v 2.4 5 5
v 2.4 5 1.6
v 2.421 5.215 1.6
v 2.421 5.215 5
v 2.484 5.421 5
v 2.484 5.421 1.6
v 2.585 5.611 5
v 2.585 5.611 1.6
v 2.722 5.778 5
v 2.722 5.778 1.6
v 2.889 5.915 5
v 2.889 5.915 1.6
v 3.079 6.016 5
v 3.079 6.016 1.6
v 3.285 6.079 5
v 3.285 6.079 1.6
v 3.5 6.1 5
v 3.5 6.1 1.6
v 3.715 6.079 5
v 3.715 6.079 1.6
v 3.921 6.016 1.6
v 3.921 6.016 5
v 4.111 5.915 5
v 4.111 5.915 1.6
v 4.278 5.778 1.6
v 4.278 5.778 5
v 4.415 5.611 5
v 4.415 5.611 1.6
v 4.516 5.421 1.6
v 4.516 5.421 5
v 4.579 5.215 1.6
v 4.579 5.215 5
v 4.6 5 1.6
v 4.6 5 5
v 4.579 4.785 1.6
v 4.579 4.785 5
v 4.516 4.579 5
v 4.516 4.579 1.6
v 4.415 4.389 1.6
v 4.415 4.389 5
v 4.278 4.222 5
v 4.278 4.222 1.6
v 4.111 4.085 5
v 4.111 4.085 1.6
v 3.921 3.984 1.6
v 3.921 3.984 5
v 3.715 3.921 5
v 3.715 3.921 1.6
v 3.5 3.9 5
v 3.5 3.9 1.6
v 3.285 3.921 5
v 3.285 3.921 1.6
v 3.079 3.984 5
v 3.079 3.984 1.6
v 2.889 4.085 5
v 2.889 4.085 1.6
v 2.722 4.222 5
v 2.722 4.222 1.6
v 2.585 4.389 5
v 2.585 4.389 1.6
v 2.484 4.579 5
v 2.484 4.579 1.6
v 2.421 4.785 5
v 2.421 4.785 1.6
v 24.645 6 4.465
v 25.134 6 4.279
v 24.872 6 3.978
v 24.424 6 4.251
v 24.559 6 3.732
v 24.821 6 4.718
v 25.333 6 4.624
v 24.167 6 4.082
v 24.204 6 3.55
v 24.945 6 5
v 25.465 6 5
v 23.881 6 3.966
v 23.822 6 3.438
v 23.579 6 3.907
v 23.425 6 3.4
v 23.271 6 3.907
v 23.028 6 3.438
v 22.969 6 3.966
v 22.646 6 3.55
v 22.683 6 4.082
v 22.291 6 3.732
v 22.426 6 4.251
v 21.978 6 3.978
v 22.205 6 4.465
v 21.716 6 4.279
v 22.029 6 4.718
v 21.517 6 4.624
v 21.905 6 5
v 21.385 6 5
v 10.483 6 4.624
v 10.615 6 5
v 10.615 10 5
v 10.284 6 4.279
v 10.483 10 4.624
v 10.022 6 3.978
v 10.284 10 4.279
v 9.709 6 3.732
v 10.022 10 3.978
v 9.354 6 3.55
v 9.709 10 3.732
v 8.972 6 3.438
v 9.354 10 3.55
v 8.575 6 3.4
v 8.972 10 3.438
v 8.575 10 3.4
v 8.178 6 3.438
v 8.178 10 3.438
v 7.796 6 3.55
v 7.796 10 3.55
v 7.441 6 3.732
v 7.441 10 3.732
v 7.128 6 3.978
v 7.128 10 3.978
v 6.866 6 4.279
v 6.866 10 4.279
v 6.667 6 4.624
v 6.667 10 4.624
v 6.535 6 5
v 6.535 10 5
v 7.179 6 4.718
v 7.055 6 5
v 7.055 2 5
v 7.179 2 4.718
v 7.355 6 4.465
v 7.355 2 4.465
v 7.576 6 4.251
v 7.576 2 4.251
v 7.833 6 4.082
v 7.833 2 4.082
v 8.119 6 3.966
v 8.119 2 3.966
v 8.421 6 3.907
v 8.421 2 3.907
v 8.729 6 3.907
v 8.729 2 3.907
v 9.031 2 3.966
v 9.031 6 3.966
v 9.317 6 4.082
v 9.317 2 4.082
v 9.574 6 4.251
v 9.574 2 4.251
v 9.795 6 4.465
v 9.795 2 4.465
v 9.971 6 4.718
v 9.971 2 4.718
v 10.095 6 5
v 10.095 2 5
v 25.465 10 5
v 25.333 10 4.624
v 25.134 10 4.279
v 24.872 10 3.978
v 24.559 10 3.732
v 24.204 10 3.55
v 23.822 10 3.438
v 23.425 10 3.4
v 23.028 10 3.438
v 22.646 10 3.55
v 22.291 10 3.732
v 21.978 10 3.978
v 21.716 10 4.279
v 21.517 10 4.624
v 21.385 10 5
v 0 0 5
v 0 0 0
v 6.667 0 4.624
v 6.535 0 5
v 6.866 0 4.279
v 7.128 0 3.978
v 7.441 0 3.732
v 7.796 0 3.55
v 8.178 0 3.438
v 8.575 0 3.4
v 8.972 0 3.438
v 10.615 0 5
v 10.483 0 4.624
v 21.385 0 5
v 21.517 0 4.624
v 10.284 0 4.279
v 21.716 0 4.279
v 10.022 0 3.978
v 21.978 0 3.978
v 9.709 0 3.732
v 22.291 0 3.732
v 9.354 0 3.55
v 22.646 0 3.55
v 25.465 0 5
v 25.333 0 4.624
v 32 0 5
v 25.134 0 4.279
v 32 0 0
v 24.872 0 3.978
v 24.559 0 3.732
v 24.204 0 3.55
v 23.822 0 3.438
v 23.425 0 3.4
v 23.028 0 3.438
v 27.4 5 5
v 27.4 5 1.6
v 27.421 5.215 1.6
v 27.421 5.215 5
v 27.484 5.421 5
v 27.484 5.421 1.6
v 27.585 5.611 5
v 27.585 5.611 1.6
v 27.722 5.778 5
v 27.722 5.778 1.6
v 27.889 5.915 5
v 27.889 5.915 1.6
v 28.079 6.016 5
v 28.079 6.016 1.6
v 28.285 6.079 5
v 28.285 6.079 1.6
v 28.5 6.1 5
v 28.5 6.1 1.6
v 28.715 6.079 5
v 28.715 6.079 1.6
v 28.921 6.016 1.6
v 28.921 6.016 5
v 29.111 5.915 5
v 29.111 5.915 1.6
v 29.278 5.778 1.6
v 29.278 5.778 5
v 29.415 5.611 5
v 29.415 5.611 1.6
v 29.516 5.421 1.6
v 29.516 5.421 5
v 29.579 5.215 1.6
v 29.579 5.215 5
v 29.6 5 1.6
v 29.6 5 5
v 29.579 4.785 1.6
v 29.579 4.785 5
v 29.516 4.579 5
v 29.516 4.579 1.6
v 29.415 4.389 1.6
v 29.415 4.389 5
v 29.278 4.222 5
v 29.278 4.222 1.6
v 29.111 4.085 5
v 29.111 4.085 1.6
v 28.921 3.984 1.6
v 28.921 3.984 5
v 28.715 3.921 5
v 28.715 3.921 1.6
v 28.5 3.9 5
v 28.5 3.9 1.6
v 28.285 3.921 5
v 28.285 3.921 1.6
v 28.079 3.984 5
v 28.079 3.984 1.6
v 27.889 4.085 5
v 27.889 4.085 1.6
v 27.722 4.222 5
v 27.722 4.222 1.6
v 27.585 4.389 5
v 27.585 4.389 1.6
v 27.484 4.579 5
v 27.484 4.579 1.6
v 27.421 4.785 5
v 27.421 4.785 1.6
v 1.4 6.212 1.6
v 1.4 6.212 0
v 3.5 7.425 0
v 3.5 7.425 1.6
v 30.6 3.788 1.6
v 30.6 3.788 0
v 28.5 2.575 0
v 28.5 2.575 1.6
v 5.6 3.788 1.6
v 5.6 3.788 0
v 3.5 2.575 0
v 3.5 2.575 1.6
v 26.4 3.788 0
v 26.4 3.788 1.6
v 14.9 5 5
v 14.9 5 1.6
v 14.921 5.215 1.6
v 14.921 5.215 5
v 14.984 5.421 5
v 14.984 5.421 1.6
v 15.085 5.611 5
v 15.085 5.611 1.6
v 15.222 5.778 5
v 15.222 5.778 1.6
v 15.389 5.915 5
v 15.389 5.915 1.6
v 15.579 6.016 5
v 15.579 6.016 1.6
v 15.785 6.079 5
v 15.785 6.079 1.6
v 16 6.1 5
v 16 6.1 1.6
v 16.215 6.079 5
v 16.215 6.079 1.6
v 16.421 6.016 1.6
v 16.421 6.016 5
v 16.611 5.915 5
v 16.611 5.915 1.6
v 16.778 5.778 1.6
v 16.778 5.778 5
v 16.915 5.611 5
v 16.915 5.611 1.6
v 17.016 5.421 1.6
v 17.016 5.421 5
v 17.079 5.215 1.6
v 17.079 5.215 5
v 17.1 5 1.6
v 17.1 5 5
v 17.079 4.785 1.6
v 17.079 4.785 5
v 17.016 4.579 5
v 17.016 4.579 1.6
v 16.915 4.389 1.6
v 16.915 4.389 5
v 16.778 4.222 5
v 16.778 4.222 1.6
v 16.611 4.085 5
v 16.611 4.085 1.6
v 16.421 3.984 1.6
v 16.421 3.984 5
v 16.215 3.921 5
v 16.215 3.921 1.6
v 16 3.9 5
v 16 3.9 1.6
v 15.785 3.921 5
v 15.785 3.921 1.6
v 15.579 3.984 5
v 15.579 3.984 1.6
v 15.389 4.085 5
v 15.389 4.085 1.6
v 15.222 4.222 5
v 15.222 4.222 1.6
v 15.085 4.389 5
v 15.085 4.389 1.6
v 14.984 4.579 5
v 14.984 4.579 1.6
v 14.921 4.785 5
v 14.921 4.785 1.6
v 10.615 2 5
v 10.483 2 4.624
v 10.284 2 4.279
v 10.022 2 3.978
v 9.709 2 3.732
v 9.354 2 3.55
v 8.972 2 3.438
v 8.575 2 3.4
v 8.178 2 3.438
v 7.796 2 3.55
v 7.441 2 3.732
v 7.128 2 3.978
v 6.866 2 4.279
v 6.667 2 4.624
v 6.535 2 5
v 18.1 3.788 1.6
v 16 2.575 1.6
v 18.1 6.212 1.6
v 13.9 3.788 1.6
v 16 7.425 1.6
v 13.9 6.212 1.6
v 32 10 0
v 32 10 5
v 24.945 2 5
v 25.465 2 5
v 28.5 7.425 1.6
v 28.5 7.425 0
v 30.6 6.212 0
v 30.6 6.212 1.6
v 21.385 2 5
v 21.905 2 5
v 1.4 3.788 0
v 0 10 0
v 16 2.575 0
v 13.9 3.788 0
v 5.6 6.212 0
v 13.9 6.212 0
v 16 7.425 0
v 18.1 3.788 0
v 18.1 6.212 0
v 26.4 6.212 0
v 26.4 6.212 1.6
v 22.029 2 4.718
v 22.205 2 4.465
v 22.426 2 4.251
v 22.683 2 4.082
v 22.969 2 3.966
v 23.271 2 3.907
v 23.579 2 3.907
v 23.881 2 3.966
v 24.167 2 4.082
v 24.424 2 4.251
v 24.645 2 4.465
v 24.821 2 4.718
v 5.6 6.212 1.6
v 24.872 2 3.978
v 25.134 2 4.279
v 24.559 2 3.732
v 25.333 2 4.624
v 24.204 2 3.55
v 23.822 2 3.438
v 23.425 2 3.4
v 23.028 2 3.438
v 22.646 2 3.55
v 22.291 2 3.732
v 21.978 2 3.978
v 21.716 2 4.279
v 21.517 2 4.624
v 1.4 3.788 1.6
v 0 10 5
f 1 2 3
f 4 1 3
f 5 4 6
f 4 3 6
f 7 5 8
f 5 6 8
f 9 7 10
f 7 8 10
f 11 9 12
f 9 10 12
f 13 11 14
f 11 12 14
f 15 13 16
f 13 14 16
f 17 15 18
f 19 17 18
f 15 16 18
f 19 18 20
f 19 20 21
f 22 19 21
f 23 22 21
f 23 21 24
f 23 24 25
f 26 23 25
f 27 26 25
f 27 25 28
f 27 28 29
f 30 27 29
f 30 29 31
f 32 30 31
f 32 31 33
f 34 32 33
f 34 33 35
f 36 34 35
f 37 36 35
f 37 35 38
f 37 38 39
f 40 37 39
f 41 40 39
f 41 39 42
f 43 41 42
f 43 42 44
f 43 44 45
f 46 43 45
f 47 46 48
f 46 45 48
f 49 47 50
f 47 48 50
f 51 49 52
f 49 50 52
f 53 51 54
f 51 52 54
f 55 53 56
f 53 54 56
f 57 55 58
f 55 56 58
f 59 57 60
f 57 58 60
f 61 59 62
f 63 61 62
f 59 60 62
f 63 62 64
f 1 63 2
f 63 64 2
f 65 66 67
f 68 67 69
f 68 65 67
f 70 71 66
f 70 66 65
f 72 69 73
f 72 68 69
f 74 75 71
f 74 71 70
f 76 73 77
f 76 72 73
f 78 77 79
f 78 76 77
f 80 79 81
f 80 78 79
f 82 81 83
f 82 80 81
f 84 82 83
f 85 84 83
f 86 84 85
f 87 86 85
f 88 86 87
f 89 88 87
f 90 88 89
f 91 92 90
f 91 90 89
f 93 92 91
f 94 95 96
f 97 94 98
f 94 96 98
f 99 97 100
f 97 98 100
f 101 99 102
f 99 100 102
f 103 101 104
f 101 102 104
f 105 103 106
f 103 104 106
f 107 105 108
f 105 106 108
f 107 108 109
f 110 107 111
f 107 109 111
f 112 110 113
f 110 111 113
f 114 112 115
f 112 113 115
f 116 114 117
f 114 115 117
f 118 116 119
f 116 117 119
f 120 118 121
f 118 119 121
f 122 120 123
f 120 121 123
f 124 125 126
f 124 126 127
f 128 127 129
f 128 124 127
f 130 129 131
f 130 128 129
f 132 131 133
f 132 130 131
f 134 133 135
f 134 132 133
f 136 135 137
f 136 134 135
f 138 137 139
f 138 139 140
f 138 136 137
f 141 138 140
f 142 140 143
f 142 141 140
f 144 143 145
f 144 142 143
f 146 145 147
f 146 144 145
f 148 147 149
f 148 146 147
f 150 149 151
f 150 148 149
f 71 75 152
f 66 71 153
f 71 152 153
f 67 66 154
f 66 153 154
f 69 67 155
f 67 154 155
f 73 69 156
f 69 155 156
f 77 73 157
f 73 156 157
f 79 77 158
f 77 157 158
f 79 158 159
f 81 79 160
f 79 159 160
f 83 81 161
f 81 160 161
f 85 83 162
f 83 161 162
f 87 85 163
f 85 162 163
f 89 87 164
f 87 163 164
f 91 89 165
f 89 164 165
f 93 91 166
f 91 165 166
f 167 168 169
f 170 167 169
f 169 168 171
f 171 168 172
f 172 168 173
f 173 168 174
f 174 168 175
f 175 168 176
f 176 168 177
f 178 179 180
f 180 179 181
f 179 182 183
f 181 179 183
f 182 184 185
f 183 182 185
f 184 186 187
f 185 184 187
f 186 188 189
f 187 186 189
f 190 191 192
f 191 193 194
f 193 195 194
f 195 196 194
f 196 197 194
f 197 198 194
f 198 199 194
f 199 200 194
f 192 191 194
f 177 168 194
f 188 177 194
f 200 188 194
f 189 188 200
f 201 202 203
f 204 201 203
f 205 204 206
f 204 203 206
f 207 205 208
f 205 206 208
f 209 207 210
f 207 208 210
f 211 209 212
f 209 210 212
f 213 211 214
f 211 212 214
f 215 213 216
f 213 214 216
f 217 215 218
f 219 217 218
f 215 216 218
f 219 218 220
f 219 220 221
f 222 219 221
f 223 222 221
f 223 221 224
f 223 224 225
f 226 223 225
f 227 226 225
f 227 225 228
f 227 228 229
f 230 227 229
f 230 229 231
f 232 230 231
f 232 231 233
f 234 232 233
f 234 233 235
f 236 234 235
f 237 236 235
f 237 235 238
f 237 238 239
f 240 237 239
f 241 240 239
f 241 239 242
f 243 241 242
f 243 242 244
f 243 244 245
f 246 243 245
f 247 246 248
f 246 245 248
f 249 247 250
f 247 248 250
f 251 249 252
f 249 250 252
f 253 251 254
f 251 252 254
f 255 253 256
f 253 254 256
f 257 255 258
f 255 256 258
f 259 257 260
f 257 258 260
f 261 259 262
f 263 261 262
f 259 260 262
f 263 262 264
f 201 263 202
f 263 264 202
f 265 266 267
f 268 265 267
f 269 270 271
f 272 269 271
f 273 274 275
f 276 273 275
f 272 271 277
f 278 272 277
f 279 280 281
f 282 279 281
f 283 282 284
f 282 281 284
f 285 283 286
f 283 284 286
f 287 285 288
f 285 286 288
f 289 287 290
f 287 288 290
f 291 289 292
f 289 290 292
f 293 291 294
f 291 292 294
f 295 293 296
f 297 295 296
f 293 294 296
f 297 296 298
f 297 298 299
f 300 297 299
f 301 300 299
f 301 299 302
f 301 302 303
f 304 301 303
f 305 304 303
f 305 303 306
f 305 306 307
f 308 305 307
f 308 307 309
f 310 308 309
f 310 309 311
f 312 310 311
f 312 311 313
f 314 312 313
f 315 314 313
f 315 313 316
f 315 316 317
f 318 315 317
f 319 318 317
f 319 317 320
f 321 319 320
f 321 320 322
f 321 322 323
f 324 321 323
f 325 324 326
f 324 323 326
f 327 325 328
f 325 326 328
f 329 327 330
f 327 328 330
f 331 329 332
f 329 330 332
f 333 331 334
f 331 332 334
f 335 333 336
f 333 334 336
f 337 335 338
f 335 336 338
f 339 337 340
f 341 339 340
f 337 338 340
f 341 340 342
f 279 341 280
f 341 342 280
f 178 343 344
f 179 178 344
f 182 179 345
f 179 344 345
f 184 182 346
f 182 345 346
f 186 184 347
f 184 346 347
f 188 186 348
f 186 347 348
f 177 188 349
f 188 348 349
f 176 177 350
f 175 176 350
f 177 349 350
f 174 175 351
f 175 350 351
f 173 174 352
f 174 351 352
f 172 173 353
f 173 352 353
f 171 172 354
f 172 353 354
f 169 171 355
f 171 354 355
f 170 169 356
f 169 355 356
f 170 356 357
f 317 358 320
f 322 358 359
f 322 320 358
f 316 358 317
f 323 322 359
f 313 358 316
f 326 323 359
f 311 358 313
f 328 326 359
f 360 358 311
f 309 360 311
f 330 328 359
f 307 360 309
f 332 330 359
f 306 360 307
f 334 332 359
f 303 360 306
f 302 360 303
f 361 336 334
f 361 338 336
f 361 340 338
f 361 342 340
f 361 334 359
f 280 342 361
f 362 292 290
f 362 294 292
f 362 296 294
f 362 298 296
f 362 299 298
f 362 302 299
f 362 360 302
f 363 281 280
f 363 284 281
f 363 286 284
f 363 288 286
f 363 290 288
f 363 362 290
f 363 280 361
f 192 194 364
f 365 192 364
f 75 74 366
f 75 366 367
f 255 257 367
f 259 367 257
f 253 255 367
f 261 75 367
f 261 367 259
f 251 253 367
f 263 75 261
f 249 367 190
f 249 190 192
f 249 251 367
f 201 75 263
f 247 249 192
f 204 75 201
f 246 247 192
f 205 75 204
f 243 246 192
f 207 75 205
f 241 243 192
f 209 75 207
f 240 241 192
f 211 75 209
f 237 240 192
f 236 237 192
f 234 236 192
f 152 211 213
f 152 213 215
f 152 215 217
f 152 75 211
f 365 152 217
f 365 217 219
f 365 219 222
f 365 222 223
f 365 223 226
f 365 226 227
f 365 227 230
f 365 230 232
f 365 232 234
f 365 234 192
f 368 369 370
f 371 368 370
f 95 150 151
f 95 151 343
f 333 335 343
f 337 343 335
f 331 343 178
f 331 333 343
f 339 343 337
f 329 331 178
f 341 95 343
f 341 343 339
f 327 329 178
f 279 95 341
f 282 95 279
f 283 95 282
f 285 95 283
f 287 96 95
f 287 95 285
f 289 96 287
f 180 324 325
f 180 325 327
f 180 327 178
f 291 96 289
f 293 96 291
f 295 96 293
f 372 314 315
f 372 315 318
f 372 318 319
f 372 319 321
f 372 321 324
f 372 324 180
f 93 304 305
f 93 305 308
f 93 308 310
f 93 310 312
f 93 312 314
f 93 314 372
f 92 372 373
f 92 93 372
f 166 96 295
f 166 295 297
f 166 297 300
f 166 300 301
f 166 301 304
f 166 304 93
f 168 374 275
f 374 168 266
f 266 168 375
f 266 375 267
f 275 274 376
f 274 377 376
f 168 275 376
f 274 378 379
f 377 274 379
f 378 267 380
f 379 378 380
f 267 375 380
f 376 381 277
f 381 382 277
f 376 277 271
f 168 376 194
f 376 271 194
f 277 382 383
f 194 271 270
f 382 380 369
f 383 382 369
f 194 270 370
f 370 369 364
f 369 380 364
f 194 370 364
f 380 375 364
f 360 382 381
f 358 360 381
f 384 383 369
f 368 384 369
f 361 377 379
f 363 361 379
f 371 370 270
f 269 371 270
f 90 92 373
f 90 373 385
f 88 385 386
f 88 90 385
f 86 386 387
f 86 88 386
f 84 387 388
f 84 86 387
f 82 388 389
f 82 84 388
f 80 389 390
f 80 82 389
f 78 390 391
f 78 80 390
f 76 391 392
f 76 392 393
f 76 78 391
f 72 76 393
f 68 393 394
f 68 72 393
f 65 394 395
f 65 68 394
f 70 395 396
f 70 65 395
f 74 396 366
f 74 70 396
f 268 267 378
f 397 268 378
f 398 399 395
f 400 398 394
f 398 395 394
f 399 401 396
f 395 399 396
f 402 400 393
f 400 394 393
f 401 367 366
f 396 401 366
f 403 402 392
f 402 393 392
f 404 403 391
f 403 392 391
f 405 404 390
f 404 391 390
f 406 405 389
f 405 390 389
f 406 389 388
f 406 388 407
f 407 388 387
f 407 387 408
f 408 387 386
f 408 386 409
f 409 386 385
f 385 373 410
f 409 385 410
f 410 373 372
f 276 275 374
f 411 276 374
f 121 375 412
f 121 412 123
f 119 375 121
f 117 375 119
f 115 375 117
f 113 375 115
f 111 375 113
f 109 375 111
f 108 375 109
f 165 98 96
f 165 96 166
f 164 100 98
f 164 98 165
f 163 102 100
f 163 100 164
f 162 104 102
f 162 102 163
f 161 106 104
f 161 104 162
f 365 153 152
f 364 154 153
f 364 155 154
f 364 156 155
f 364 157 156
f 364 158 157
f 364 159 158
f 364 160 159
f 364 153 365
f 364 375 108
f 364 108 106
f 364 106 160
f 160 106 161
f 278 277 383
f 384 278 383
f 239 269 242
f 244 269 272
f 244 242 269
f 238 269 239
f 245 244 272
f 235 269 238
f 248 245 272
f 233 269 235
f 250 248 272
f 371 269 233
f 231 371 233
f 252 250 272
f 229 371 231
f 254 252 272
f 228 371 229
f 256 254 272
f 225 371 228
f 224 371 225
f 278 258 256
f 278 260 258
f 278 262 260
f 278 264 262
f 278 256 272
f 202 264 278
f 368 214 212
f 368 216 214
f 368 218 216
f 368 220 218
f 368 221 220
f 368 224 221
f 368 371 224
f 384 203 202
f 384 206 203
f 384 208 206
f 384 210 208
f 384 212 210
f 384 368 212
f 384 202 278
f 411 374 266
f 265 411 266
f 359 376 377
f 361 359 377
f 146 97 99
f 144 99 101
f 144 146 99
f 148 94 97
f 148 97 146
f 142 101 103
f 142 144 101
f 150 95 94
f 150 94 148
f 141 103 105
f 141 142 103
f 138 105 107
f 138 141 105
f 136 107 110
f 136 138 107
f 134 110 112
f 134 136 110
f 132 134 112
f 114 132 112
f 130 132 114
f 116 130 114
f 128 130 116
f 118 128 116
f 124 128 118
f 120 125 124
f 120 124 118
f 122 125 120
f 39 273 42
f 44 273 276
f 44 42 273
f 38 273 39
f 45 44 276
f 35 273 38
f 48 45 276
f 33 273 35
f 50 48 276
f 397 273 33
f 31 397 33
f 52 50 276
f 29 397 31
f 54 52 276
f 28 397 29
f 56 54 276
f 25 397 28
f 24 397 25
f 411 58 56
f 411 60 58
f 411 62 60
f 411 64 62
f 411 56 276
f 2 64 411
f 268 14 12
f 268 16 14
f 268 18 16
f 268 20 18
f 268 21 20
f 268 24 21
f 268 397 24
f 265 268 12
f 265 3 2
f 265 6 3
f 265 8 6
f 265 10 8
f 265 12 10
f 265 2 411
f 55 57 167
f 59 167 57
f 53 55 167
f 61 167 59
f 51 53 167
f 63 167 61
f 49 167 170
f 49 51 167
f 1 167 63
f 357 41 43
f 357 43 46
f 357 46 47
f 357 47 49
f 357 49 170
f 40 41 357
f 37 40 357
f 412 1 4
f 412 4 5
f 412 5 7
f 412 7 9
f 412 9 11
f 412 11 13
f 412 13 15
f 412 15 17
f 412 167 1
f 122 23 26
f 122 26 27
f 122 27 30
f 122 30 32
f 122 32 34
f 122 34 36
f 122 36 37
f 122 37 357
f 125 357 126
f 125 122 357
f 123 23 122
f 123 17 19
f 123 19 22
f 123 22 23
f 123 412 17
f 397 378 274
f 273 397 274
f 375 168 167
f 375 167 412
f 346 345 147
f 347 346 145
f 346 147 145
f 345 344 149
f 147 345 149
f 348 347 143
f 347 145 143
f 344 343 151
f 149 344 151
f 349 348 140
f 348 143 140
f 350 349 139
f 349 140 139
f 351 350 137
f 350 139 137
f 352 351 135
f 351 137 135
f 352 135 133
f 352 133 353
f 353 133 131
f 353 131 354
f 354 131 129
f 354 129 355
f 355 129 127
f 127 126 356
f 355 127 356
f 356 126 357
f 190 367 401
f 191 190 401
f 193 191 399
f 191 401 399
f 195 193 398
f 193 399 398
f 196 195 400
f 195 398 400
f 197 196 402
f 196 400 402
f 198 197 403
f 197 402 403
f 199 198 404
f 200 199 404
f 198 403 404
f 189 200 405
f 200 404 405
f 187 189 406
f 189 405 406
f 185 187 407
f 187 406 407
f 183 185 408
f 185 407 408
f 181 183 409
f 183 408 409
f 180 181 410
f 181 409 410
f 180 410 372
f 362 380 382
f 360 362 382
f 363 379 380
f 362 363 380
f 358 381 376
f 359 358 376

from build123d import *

# Parameters (mm, degrees)
SKETCH_1_W          = 32
SKETCH_1_H          = 10
EXTRUDE_1_DEPTH     = 5
SKETCH_2_R          = 2.1
CUT_EXTRUDE_1_DEPTH = 11
EXTRUDE_2_DEPTH     = 4
SKETCH_5_R          = 1.1
CUT_EXTRUDE_2_DEPTH = 6
CUT_EXTRUDE_3_DEPTH = 1.6


with BuildPart() as part:
    # Эскиз1 → Бобышка-Вытянуть1 (new body)
    with BuildSketch(Plane.XY):
        with Locations((16, 5)):
            Rectangle(SKETCH_1_W, SKETCH_1_H)
    extrude(amount=EXTRUDE_1_DEPTH)

    # Эскиз2 → Вырез-Вытянуть1 (cut, through all)
    with BuildSketch(Plane(origin=(0, 10, 0), x_dir=(1, 0, 0), z_dir=(0, 1, 0))):
        with Locations((8.575, -5.5)):
            Circle(SKETCH_2_R)
        with Locations((23.425, -5.5)):
            Circle(SKETCH_2_R)
    extrude(amount=-CUT_EXTRUDE_1_DEPTH, mode=Mode.SUBTRACT)

    # Эскиз4 → Бобышка-Вытянуть2 (add)
    with BuildSketch(Plane.XZ.offset(-6)):
        with BuildLine():
            Line((6.535392195, 5), (7.055131585, 5))
            ThreePointArc((7.055131585, 5), (8.575, 3.9), (10.094868415, 5))
            Line((10.094868415, 5), (10.614607805, 5))
            ThreePointArc((10.614607805, 5), (8.575, 3.4), (6.535392195, 5))
        make_face()
        with BuildLine():
            Line((21.385392195, 5), (21.905131585, 5))
            ThreePointArc((21.905131585, 5), (23.425, 3.9), (24.944868415, 5))
            Line((24.944868415, 5), (25.464607805, 5))
            ThreePointArc((25.464607805, 5), (23.425, 3.4), (21.385392195, 5))
        make_face()
    extrude(amount=EXTRUDE_2_DEPTH)

    # Эскиз5 → Вырез-Вытянуть2 (cut, through all)
    with BuildSketch(Plane(origin=(0, 0, 0), x_dir=(-1, 0, 0), z_dir=(0, 0, -1))):
        with Locations((-3.5, 5)):
            Circle(SKETCH_5_R)
        with Locations((-16, 5)):
            Circle(SKETCH_5_R)
        with Locations((-28.5, 5)):
            Circle(SKETCH_5_R)
    extrude(amount=-CUT_EXTRUDE_2_DEPTH, mode=Mode.SUBTRACT)

    # Эскиз6 → Вырез-Вытянуть3 (cut)
    with BuildSketch(Plane(origin=(0, 0, 0), x_dir=(-1, 0, 0), z_dir=(0, 0, -1))):
        Polygon((-16, 2.575128869), (-13.9, 3.787564435), (-13.9, 6.212435565), (-16, 7.424871131), (-18.1, 6.212435565), (-18.1, 3.787564435), align=None)
        Polygon((-3.5, 2.575128869), (-1.4, 3.787564435), (-1.4, 6.212435565), (-3.5, 7.424871131), (-5.6, 6.212435565), (-5.6, 3.787564435), align=None)
        Polygon((-28.5, 2.575128869), (-26.4, 3.787564435), (-26.4, 6.212435565), (-28.5, 7.424871131), (-30.6, 6.212435565), (-30.6, 3.787564435), align=None)
    extrude(amount=-CUT_EXTRUDE_3_DEPTH, mode=Mode.SUBTRACT)


solid = part.part
